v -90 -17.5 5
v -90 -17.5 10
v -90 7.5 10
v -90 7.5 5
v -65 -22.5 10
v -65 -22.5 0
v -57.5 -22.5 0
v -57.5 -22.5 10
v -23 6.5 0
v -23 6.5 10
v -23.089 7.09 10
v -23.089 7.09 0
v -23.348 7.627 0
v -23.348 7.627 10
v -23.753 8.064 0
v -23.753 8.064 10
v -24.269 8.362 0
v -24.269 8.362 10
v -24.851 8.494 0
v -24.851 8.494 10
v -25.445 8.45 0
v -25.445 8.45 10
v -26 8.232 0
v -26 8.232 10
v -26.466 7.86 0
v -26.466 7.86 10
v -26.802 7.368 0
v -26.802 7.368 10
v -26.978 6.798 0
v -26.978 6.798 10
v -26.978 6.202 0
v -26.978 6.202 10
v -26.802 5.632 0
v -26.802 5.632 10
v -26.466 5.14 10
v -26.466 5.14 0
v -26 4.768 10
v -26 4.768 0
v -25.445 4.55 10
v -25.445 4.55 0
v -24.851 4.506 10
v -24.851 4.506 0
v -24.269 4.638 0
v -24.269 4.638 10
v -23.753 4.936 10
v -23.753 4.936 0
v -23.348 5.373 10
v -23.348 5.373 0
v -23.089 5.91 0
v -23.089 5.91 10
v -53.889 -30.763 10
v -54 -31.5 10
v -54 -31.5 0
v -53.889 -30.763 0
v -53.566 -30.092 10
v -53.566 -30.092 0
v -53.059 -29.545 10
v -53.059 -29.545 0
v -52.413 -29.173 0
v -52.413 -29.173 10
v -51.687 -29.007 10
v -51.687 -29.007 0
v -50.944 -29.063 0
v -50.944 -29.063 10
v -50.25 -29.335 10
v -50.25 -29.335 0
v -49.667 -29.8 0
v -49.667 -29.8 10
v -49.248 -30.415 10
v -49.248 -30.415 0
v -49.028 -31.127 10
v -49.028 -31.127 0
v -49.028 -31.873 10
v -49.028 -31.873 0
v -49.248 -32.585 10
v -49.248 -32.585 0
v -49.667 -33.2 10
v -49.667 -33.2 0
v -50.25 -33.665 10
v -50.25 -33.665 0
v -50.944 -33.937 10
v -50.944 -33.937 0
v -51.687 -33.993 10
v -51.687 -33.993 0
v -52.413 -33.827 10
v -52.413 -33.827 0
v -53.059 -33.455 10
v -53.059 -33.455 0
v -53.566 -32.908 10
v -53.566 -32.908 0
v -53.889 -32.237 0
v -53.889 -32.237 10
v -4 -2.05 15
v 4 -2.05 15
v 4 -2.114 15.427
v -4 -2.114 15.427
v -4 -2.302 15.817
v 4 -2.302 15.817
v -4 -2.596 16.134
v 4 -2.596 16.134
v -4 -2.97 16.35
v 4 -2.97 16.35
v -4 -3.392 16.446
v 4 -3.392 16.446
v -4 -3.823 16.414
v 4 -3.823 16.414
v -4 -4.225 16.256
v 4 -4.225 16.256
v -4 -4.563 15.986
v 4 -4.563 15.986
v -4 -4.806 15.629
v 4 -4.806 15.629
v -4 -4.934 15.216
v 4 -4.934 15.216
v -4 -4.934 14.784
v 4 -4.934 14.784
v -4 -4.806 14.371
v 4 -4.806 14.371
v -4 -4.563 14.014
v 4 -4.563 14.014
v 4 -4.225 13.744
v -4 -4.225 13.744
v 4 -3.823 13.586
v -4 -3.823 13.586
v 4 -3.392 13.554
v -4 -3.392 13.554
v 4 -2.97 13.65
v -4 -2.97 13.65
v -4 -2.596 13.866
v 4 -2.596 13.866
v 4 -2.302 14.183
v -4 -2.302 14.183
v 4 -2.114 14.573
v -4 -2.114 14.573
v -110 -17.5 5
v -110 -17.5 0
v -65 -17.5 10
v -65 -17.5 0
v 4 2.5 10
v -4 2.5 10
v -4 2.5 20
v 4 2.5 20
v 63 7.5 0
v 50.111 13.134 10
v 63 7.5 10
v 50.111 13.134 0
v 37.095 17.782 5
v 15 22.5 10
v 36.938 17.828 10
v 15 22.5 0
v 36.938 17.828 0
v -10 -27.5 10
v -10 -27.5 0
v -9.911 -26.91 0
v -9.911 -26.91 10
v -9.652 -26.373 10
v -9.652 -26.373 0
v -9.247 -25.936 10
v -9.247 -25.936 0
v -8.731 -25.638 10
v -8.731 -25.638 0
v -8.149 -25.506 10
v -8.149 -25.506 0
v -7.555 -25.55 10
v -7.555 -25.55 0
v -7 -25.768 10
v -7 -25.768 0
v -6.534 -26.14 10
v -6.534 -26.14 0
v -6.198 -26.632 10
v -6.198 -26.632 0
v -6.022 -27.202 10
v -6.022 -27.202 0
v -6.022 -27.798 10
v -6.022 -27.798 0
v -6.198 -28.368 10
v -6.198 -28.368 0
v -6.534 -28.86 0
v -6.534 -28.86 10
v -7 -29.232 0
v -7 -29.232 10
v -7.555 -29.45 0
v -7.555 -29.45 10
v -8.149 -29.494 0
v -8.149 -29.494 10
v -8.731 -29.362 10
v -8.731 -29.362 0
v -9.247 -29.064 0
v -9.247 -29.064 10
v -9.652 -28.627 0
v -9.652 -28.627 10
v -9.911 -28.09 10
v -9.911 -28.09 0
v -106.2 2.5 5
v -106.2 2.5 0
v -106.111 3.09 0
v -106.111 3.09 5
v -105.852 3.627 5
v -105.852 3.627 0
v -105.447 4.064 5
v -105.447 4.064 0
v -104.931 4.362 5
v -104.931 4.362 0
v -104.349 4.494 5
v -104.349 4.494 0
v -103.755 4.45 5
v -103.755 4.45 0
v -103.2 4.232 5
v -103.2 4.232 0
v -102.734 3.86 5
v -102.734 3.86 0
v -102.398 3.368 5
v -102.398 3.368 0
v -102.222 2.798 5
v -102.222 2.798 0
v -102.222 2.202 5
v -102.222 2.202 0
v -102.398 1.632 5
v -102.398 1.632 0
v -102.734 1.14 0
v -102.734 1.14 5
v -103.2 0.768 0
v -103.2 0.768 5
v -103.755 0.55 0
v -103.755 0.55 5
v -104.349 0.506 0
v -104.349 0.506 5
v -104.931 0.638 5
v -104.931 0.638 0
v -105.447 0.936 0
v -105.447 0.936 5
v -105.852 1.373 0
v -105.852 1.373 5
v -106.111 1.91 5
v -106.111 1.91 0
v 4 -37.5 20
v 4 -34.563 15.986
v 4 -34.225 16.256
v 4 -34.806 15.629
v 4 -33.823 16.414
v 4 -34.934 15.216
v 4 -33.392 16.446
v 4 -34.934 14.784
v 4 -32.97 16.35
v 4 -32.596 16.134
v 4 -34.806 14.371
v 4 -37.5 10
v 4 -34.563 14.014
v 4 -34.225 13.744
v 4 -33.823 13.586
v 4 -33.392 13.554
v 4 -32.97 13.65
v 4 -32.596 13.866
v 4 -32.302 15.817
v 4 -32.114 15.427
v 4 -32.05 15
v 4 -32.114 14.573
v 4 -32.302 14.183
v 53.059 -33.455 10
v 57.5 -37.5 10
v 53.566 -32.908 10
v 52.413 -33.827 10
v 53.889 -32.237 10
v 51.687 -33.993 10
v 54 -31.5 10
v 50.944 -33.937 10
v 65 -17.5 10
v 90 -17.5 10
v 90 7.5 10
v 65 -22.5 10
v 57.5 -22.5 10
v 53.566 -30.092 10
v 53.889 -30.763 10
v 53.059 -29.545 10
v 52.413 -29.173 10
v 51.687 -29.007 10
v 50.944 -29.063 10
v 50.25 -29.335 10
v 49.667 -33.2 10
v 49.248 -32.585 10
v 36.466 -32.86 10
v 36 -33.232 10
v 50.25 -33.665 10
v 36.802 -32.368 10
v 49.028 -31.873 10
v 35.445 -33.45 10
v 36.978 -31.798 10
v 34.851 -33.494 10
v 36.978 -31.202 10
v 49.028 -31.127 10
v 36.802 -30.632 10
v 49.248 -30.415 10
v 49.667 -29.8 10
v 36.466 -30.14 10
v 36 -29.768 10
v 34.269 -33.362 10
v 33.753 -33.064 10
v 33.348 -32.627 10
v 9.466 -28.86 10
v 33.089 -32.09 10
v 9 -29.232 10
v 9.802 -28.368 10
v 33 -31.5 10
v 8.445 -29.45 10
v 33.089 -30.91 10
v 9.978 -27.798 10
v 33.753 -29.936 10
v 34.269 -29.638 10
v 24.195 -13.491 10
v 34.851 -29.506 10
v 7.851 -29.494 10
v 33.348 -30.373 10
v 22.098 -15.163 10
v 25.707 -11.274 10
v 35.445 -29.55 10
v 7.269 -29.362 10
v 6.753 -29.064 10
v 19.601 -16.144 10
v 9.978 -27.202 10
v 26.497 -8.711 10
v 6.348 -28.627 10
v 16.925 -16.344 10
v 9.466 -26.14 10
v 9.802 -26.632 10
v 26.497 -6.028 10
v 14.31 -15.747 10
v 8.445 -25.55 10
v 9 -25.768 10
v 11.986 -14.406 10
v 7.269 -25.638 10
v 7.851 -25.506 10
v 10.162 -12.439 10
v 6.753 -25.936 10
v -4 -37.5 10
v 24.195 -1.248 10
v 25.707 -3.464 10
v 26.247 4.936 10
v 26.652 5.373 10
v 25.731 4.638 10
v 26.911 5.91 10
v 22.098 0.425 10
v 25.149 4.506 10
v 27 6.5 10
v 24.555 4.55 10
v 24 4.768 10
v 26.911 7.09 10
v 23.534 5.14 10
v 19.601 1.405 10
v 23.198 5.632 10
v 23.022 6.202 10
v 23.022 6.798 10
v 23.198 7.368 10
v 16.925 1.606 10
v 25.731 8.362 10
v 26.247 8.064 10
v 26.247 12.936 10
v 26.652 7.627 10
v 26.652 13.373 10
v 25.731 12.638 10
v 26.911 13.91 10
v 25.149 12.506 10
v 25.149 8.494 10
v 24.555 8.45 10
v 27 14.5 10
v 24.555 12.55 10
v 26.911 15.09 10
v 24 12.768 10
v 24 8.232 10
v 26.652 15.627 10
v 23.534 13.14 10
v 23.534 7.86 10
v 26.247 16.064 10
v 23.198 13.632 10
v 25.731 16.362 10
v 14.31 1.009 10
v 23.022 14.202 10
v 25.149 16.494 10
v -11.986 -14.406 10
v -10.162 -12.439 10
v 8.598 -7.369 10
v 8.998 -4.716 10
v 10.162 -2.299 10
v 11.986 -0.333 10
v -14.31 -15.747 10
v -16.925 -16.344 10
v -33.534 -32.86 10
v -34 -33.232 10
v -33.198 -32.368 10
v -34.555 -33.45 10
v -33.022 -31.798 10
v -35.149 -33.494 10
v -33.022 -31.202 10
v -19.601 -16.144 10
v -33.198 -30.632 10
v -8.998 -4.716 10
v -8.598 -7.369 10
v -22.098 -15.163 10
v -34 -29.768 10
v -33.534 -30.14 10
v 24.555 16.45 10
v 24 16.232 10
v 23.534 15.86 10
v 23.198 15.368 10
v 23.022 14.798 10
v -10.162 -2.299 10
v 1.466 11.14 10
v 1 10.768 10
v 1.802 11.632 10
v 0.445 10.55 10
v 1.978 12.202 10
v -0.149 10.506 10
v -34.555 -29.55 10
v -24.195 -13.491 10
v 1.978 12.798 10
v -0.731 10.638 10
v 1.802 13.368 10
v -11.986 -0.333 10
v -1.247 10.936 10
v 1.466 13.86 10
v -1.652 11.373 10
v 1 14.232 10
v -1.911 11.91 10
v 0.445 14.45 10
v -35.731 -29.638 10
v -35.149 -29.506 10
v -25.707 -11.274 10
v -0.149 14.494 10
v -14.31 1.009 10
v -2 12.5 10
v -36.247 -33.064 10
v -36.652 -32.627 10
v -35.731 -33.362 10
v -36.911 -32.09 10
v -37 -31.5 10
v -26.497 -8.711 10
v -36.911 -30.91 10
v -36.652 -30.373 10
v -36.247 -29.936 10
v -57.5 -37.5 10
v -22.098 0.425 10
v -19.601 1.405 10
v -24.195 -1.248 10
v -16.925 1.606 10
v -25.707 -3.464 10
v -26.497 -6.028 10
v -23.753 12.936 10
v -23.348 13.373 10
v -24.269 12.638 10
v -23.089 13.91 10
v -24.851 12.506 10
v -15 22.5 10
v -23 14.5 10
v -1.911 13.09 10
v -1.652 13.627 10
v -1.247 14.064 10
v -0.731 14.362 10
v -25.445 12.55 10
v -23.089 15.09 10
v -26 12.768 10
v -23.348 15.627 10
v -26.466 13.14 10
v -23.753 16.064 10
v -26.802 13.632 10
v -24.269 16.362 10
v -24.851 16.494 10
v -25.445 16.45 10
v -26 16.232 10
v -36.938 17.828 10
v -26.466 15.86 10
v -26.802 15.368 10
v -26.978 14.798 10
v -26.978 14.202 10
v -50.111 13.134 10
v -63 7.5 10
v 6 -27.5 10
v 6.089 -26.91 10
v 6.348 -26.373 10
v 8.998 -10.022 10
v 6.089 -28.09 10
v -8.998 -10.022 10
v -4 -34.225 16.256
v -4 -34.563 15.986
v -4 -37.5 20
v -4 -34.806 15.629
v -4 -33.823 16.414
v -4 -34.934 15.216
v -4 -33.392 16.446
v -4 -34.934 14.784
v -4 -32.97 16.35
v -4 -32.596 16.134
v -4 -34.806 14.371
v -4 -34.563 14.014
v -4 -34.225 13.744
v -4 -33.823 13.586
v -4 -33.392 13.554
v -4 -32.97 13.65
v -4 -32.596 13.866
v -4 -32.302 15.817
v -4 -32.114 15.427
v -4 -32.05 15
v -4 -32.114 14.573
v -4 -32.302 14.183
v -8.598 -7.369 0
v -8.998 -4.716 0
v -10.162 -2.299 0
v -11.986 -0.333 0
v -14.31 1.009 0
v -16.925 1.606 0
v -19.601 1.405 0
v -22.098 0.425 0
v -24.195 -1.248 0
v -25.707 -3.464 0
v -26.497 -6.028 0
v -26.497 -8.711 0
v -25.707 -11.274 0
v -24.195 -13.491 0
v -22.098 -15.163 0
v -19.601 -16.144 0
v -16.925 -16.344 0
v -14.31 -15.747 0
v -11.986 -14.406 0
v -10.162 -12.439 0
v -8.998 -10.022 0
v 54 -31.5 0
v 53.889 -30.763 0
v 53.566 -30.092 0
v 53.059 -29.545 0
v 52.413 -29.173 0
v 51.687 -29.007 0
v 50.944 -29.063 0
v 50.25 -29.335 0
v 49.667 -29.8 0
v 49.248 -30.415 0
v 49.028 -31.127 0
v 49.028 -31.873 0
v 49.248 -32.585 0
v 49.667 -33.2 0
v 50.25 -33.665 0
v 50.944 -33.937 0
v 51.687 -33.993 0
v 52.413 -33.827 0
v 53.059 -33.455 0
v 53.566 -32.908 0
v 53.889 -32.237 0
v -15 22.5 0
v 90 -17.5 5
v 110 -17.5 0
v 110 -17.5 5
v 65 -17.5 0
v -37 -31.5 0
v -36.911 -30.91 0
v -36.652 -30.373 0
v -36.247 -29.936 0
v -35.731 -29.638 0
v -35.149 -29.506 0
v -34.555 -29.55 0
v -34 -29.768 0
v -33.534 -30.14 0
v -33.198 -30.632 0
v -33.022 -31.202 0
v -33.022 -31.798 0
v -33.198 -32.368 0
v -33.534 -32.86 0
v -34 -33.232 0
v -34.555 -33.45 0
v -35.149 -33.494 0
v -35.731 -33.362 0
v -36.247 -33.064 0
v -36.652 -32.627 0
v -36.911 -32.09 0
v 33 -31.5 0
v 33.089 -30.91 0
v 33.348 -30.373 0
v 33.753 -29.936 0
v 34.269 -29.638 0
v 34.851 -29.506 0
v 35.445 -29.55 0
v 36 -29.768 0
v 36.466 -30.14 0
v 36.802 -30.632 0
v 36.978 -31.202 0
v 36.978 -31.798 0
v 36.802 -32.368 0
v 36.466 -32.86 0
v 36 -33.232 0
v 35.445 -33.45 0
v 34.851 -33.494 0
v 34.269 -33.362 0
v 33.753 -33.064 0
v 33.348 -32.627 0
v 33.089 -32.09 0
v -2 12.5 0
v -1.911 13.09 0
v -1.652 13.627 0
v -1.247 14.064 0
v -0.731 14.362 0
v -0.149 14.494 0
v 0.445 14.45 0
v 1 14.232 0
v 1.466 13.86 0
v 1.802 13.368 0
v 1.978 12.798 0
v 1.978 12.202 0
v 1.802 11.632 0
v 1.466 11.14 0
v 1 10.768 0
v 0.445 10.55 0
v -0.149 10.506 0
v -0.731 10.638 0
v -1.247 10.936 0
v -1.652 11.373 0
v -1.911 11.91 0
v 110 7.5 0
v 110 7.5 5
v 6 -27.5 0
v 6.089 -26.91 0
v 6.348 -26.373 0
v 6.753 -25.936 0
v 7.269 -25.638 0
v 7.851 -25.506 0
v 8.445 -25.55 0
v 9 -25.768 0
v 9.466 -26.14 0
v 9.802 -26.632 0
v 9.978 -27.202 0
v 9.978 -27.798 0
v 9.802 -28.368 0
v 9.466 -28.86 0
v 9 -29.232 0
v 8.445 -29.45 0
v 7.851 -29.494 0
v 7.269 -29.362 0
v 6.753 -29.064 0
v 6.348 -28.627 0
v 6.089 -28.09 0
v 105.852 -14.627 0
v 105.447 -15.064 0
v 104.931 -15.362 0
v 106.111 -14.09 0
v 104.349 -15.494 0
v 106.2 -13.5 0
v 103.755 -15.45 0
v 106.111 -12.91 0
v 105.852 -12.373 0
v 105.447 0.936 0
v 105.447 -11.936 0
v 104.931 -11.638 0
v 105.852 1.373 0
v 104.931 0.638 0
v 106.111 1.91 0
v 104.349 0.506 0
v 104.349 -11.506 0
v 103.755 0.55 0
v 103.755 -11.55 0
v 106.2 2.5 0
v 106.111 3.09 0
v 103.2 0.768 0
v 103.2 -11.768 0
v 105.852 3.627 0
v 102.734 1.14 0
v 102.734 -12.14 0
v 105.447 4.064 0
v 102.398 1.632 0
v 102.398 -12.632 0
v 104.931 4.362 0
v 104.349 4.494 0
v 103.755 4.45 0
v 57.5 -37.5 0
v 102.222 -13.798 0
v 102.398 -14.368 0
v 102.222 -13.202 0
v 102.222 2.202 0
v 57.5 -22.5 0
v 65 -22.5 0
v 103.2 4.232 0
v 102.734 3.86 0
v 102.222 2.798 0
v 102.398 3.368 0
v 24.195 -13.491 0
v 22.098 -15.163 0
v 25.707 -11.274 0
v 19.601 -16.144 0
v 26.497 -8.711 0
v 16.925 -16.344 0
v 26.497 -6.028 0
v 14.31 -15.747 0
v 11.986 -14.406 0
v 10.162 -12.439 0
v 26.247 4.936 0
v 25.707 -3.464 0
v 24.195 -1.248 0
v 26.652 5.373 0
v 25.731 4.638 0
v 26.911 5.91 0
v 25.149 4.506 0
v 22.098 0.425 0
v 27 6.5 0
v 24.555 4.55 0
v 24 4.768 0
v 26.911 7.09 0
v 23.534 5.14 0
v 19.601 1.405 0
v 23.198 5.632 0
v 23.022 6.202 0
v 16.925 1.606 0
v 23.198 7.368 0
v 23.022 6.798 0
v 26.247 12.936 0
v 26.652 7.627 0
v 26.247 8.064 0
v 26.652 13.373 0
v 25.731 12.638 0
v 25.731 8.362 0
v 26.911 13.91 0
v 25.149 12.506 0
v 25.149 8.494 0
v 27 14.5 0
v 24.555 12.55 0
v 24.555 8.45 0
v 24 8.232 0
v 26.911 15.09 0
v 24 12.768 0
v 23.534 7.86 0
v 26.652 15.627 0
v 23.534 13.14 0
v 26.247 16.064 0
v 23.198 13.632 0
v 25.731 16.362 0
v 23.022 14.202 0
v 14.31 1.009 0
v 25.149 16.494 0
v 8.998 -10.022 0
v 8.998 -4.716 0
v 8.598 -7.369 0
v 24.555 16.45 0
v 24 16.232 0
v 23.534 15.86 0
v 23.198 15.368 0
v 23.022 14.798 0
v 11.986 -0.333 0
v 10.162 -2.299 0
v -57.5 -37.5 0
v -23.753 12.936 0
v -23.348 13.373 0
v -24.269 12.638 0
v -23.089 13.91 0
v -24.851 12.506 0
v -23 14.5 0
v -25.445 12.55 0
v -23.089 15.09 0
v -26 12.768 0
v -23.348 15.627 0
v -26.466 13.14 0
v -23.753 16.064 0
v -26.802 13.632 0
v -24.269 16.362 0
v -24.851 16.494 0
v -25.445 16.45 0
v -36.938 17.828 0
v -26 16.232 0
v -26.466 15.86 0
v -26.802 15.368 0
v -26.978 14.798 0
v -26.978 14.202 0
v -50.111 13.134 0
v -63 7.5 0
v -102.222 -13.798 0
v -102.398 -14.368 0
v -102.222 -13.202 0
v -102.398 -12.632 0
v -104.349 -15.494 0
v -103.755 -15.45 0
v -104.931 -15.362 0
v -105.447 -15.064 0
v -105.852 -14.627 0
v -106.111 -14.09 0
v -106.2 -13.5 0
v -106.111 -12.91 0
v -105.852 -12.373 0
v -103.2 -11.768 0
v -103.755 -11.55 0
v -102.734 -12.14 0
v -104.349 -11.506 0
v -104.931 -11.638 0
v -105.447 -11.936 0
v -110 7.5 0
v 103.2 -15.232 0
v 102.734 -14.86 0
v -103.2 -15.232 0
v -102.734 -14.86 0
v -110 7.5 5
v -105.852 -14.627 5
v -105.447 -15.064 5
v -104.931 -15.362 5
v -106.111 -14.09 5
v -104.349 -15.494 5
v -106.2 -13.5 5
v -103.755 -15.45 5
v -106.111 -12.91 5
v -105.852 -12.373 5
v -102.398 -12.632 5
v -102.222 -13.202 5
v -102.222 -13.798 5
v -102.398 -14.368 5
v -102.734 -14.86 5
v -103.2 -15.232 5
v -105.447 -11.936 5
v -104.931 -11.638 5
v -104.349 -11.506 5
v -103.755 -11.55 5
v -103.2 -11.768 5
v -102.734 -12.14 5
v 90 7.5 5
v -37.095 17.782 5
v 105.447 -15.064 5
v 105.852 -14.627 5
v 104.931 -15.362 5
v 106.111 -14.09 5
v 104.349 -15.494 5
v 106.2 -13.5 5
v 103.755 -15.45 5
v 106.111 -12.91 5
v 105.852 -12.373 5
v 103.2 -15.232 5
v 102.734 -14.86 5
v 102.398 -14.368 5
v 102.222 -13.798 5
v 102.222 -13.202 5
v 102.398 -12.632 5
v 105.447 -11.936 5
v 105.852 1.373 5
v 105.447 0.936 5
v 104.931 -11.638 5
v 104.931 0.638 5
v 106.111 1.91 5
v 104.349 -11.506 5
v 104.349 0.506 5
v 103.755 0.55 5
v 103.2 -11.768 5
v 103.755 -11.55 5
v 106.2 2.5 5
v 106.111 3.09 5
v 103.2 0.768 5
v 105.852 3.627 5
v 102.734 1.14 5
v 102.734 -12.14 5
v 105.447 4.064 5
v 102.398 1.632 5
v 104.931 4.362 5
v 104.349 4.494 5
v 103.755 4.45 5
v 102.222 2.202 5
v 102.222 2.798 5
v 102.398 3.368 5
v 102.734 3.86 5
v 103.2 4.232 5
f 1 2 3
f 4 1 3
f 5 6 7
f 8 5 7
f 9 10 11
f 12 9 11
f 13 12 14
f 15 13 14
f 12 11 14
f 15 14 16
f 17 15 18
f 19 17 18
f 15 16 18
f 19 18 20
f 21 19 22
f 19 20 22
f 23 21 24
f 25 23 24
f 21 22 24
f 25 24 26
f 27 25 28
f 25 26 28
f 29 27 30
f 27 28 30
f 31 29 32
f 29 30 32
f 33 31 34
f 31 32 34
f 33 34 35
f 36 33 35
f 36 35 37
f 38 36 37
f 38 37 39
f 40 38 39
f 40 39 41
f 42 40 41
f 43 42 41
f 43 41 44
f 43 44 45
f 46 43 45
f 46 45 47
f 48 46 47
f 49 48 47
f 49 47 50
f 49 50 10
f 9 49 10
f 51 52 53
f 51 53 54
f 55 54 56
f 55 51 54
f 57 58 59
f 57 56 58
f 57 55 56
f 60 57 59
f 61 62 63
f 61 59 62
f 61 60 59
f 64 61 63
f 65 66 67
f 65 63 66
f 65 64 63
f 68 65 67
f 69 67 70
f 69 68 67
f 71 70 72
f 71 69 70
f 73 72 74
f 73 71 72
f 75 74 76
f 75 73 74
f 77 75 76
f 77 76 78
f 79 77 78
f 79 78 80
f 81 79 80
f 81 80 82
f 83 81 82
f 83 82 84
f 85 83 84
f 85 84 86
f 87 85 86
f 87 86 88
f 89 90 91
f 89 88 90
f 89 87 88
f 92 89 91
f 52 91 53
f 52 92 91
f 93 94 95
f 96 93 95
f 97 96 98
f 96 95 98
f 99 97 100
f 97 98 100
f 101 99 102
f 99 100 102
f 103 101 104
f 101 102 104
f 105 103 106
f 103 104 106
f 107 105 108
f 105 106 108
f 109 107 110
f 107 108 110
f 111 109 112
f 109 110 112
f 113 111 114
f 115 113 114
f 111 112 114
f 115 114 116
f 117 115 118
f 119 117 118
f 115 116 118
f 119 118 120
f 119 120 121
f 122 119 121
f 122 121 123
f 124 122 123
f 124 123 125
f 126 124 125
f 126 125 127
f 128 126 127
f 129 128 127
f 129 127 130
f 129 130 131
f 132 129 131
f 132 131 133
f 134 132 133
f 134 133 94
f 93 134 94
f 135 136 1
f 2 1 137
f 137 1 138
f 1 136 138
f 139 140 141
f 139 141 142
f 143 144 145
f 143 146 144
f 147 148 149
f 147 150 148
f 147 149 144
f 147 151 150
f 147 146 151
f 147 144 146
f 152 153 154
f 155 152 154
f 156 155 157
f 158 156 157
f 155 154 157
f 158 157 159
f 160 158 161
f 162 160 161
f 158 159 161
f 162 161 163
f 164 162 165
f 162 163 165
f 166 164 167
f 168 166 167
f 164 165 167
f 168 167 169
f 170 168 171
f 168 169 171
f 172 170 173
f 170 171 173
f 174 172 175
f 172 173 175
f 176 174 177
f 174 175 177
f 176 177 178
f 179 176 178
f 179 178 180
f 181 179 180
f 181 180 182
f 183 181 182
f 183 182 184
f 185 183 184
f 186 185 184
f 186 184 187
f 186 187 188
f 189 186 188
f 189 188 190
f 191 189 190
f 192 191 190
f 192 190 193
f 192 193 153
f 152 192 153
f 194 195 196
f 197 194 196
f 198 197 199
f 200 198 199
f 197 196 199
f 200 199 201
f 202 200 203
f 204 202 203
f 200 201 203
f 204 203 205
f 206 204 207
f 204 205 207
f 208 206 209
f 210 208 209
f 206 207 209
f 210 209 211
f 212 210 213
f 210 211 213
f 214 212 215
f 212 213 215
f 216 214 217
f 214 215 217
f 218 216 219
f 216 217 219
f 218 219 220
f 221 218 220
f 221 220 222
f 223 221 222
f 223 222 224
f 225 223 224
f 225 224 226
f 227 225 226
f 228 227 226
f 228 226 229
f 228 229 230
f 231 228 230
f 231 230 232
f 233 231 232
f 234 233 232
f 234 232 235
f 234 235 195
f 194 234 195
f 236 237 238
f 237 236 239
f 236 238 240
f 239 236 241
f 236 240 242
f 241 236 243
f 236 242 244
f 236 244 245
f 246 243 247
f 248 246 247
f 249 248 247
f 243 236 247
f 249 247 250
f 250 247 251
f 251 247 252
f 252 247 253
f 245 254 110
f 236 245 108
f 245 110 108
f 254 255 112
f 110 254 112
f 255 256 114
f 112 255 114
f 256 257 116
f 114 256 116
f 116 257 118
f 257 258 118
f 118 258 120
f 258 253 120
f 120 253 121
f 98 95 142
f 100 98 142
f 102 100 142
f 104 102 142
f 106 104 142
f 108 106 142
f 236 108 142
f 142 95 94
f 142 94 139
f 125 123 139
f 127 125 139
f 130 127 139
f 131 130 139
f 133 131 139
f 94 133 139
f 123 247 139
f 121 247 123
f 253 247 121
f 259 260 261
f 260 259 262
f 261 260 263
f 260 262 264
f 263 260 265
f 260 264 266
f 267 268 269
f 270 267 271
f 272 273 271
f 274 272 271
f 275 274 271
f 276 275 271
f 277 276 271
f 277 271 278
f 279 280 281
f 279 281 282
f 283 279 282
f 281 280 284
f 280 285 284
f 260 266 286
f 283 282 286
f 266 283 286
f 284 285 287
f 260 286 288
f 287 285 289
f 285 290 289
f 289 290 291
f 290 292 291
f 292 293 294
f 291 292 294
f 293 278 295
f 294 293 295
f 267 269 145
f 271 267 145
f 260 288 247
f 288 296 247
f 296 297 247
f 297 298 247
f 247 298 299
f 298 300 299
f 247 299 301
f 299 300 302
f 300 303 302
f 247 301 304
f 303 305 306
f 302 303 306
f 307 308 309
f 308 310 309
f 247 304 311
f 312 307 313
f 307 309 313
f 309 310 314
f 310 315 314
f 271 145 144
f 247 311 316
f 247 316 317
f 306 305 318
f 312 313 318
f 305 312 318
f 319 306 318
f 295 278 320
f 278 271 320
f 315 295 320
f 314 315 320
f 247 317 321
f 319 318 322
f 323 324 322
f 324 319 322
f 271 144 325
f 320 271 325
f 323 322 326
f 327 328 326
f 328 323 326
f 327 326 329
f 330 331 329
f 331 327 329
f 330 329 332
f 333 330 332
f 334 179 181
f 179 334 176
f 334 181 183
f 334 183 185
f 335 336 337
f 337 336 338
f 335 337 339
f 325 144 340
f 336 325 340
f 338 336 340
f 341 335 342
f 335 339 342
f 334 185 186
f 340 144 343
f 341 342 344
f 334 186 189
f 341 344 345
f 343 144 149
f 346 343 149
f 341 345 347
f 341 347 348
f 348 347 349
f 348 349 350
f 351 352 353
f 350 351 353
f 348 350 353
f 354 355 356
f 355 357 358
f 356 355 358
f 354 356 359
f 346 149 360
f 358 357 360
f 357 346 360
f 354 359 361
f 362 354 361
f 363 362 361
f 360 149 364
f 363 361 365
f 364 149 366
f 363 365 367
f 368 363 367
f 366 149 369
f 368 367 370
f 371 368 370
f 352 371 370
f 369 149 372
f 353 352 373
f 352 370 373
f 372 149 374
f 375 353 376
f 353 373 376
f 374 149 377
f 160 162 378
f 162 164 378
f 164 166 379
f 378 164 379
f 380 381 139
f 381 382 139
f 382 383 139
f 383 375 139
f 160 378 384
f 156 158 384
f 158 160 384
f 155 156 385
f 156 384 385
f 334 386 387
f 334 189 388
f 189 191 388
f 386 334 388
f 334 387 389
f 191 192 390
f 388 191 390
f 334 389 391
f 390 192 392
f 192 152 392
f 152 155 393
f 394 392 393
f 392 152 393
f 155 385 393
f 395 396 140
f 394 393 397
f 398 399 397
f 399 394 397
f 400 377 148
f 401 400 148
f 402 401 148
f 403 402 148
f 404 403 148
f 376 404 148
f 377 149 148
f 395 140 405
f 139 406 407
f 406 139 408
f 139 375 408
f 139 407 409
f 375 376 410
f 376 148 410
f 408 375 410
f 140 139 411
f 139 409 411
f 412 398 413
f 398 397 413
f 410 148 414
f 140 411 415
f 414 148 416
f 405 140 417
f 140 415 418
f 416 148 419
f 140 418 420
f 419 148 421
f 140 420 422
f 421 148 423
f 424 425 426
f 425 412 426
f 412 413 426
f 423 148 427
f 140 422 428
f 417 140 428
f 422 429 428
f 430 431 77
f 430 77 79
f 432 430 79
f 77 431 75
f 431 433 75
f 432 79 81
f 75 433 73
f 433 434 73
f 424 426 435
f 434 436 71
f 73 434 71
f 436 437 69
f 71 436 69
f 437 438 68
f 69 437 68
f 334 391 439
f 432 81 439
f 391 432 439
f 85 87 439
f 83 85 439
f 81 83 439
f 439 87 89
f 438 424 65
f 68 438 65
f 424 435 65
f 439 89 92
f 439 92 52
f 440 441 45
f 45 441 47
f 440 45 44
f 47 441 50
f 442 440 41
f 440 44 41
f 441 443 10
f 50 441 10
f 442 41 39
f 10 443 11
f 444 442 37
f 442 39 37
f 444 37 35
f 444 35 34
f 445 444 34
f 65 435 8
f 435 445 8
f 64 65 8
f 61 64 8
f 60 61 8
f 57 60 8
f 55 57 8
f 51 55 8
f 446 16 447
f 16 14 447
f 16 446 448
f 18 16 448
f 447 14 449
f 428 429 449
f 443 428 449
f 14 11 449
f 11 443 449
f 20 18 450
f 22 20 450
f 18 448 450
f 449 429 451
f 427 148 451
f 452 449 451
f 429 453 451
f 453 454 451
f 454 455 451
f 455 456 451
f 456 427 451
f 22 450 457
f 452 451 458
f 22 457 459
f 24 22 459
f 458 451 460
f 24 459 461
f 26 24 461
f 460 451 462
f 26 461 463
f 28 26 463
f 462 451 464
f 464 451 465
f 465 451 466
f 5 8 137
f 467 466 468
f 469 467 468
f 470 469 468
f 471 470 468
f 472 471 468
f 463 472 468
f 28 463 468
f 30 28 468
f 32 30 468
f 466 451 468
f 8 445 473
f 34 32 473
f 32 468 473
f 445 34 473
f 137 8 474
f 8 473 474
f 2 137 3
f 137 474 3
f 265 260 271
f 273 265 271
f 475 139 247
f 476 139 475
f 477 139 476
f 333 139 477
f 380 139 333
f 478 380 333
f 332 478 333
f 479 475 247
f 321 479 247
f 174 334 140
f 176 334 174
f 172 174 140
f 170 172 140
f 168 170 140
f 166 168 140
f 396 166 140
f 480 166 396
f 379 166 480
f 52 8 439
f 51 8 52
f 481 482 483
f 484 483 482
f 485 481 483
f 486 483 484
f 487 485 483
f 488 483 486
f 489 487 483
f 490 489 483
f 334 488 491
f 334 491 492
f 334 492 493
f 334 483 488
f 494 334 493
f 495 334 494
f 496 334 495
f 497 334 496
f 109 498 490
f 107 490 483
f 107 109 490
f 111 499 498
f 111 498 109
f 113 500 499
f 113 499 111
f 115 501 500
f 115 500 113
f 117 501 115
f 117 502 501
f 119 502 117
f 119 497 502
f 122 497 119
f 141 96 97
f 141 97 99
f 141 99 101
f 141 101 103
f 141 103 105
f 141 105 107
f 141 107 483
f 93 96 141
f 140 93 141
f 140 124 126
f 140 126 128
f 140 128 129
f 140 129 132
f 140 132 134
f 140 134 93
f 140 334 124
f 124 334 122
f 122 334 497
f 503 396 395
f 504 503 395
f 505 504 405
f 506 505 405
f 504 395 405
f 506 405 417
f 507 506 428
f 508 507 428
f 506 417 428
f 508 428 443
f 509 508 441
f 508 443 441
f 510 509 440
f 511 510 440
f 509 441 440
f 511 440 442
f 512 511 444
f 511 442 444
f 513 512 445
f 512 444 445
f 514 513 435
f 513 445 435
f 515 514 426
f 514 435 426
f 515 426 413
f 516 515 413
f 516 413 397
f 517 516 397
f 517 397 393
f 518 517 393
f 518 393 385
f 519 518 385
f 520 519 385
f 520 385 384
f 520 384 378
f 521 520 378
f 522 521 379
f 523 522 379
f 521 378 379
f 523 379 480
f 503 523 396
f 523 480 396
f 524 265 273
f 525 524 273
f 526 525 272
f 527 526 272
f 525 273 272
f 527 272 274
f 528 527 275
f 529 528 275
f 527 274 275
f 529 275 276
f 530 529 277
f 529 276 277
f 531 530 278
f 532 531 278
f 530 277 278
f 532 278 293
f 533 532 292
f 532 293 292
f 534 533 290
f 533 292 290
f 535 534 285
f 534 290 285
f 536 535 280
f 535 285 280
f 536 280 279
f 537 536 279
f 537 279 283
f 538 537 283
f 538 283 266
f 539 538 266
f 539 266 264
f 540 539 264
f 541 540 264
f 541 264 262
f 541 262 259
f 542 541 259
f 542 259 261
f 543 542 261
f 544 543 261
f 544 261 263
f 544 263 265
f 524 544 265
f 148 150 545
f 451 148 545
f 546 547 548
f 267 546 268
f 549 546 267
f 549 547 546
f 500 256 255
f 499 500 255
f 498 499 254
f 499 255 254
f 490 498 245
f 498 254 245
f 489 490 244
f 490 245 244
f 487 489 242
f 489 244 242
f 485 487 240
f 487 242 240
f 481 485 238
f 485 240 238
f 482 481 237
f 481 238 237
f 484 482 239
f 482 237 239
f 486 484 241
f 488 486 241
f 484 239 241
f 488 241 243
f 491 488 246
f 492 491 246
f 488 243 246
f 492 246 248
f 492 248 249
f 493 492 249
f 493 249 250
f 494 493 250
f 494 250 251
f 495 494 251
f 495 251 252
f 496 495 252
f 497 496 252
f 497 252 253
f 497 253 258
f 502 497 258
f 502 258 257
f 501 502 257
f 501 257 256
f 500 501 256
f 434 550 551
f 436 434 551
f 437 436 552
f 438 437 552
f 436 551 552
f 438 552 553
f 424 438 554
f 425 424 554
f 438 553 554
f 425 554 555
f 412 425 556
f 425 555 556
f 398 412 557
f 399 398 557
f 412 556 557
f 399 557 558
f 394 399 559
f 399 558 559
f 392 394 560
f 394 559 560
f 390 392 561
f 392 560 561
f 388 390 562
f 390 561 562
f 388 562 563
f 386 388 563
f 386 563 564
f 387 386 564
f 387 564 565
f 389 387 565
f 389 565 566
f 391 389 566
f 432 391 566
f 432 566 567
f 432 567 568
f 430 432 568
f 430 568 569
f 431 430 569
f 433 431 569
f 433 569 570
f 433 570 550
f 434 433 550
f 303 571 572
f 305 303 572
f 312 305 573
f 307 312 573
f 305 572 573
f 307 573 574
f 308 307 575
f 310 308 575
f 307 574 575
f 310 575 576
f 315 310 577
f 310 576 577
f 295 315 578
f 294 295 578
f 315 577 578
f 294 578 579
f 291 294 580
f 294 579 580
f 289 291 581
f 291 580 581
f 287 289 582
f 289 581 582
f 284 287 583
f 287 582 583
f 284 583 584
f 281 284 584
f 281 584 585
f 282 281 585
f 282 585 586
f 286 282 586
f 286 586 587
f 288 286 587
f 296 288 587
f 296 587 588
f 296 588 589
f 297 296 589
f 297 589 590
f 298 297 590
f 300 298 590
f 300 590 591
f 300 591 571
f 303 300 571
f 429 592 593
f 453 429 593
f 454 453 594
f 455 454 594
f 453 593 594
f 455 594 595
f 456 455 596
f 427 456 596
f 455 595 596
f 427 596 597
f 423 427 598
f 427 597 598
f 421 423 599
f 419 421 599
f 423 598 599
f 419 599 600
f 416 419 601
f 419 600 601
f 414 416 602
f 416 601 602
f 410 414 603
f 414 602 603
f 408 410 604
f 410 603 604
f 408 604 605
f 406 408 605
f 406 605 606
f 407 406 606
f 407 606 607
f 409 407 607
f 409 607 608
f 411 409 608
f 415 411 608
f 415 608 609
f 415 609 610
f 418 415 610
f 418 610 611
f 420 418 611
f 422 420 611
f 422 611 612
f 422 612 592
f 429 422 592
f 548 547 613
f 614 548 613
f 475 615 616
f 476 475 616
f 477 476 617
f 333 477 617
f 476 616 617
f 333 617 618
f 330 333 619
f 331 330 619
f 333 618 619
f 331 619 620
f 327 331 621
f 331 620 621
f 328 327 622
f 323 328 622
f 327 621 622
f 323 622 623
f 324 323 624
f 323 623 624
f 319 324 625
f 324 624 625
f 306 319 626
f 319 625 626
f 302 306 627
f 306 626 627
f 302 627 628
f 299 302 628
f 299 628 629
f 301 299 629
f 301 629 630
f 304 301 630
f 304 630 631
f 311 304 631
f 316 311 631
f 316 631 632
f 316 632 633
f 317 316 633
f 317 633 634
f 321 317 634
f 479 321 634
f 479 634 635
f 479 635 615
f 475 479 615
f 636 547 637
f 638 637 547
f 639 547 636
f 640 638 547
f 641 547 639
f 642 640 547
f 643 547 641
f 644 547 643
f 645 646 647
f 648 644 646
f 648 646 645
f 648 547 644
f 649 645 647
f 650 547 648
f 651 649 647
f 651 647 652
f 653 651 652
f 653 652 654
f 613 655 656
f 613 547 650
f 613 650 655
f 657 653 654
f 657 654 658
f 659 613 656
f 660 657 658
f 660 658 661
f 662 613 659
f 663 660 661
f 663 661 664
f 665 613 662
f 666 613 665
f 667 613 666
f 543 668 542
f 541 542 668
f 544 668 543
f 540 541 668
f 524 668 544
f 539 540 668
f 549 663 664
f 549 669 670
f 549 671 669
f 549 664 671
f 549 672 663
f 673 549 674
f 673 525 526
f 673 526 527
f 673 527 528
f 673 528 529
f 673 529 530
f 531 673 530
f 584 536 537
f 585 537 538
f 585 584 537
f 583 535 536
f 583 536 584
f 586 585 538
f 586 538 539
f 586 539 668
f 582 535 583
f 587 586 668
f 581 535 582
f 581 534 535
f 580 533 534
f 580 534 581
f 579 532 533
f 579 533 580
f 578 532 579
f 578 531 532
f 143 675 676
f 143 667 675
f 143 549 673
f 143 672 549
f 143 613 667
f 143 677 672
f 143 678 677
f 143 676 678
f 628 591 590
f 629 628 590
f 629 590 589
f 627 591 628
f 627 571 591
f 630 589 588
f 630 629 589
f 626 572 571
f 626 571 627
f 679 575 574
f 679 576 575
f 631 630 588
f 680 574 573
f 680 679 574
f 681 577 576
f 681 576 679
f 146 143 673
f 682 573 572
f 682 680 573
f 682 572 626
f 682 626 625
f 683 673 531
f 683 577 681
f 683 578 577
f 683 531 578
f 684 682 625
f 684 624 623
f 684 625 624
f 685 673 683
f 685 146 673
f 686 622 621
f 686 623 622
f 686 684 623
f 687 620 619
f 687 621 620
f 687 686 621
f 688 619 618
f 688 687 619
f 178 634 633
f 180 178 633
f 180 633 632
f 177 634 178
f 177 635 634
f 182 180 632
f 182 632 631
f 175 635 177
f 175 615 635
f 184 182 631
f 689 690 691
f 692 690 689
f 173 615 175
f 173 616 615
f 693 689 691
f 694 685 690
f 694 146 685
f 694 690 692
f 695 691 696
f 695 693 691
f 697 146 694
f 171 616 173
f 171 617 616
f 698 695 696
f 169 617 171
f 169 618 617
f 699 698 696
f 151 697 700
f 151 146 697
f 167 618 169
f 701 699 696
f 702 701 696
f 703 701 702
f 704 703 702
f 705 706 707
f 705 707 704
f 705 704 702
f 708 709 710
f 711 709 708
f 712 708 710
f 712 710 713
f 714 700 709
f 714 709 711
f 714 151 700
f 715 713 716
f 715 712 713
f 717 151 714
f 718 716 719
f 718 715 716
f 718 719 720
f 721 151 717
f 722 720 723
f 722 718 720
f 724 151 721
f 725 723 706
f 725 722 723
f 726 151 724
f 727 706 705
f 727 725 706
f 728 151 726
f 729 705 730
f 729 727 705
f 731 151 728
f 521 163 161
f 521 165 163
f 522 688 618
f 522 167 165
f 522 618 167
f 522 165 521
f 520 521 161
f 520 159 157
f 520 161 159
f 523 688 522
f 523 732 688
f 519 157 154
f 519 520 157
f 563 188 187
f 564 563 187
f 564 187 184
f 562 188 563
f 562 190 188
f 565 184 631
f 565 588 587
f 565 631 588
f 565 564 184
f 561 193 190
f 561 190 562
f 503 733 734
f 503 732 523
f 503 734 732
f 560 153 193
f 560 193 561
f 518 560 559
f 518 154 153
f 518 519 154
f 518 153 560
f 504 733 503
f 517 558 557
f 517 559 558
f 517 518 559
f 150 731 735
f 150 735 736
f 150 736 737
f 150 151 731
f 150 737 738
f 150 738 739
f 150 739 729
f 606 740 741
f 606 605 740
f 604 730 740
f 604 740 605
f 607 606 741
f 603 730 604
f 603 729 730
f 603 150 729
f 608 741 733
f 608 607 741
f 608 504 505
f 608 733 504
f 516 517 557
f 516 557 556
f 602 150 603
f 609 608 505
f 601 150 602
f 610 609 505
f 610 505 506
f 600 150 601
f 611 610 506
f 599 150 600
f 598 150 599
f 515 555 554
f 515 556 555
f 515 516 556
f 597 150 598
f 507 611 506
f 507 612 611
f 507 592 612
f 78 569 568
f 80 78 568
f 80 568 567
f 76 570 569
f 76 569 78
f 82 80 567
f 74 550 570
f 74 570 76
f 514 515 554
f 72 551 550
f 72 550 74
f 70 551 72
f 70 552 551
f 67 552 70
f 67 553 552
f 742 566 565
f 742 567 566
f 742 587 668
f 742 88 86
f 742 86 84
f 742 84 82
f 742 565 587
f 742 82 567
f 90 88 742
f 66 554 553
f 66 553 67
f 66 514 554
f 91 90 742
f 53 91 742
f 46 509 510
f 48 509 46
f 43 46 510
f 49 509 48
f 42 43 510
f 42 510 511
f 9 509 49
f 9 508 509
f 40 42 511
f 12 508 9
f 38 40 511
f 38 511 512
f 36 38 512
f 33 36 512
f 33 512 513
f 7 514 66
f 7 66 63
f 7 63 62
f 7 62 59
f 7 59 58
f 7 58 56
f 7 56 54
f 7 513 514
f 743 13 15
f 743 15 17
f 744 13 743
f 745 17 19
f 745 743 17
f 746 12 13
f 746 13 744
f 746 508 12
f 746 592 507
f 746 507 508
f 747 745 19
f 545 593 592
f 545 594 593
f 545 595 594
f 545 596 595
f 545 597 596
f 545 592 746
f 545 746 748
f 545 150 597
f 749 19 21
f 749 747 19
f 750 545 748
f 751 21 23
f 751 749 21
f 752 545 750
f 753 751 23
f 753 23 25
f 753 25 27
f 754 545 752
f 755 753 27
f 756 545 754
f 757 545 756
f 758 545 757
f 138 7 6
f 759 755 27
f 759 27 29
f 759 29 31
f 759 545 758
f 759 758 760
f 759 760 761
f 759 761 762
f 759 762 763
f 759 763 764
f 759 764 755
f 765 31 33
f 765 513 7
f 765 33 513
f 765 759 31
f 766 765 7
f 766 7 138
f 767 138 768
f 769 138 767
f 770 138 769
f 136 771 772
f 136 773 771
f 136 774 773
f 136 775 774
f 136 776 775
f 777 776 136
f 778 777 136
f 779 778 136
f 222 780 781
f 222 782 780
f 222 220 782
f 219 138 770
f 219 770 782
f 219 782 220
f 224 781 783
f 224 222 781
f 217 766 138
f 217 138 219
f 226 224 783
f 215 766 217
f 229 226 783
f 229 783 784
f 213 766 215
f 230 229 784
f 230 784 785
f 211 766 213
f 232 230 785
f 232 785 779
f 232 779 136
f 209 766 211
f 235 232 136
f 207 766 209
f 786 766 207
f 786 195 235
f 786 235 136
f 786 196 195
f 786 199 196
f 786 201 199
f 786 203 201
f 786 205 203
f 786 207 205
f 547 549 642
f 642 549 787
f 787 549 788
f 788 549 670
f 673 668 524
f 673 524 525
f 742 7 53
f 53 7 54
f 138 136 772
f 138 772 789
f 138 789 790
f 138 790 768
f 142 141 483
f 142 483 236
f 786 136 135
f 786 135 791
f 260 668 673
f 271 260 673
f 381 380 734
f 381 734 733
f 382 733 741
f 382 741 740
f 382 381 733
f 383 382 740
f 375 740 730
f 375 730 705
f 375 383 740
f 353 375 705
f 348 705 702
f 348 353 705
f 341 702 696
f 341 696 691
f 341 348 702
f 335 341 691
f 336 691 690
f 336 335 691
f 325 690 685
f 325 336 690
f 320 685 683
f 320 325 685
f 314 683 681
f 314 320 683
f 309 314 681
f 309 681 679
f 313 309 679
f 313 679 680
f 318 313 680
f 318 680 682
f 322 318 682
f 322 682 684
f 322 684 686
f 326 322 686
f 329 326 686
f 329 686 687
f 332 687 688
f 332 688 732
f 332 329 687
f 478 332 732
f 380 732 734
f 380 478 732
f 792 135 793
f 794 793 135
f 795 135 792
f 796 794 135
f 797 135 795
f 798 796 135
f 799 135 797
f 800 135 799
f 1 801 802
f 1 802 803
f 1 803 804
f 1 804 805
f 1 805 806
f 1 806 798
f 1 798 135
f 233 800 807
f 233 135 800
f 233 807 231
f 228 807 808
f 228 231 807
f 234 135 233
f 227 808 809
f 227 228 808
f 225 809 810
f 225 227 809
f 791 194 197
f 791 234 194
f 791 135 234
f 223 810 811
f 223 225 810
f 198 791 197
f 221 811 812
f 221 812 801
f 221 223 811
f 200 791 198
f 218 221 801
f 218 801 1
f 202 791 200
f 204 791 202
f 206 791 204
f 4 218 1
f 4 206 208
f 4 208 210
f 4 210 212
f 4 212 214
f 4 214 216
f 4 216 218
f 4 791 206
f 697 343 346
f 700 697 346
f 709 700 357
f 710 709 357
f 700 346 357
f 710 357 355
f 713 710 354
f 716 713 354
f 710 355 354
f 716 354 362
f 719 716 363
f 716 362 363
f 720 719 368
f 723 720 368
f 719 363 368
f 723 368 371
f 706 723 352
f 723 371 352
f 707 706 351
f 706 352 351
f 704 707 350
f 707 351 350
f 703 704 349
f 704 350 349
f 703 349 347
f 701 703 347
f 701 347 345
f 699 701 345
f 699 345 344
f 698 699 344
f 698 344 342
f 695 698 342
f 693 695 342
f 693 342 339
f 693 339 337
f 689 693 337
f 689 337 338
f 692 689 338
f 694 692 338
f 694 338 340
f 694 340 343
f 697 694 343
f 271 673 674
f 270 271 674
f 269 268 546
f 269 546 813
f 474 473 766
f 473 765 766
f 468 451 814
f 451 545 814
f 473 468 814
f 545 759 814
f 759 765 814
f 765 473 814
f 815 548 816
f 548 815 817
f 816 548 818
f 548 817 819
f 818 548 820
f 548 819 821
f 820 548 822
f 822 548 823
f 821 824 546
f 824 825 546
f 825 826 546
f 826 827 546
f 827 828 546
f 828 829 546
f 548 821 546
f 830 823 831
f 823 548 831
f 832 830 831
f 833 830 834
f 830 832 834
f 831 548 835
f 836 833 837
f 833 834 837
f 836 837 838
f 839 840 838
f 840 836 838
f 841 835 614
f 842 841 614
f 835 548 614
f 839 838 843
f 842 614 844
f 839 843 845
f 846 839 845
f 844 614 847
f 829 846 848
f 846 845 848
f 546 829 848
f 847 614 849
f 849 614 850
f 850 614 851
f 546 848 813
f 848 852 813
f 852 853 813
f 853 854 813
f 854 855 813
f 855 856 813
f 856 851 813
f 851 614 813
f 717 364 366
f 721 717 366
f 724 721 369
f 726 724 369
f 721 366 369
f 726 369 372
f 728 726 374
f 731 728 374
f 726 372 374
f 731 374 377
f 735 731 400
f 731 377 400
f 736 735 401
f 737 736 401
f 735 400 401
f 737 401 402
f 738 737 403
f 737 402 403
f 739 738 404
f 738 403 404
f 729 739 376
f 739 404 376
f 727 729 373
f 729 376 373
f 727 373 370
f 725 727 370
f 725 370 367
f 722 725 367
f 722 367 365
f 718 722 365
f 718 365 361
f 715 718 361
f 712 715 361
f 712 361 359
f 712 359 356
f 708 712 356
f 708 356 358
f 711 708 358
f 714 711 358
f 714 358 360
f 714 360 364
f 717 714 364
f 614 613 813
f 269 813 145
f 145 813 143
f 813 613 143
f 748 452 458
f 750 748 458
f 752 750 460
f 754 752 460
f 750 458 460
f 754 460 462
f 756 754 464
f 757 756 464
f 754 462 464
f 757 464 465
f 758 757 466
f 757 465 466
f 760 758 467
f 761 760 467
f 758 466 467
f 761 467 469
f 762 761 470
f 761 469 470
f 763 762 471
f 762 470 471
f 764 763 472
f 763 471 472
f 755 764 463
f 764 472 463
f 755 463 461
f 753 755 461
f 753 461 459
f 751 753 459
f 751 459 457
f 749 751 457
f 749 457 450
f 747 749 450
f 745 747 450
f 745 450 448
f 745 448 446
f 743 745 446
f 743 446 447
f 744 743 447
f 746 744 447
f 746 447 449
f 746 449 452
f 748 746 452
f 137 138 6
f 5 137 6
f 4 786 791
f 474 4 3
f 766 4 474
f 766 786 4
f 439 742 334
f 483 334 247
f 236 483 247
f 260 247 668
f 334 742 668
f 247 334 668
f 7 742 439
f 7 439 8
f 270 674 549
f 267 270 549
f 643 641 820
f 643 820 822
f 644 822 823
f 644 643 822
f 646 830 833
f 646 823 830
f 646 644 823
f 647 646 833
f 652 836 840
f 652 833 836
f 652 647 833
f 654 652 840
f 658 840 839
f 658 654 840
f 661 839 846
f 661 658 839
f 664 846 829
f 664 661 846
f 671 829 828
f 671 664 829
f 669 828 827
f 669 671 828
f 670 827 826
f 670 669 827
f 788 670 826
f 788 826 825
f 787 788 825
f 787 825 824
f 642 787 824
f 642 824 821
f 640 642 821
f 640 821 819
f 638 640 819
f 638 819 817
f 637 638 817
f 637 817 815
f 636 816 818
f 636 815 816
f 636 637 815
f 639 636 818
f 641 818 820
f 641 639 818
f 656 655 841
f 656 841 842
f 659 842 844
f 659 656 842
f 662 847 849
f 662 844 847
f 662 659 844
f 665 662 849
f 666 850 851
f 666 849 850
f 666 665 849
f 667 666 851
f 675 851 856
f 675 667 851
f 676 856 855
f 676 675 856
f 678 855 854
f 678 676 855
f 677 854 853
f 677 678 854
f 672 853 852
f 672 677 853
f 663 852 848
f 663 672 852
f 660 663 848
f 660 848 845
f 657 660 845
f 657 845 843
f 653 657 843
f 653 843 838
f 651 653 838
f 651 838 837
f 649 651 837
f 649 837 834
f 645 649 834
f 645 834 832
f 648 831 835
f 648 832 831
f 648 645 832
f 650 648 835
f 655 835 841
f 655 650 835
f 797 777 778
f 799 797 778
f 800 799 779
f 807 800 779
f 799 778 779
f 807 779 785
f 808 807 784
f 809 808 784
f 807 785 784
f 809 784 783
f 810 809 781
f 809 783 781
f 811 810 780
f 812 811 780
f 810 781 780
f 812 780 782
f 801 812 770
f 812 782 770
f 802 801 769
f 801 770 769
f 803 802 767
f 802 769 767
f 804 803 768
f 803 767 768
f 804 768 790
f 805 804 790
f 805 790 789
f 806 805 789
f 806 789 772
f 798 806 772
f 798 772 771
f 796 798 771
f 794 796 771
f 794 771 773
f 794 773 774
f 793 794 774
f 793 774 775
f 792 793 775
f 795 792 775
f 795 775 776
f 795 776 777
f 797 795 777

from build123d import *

# Parameters (mm, degrees)
EXTRUDE1_DEPTH                 = 10
SKETCH2_W                      = 115
SKETCH2_H                      = 15
EXTRUDE2_DEPTH                 = 10
F_4_0_4_DIAMETER_HOLE1_D       = 4
F_4_0_4_DIAMETER_HOLE1_DEPTH   = 15
SKETCH4_W                      = 8
SKETCH4_H                      = 40
EXTRUDE3_DEPTH                 = 10
F_4_0_4_DIAMETER_HOLE3_D       = 4
F_4_0_4_DIAMETER_HOLE3_DEPTH   = 15
F_5_0_5_DIAMETER_HOLE1_D       = 5
F_5_0_5_DIAMETER_HOLE1_DEPTH   = 15
F_4_0_4_DIAMETER_HOLE5_D       = 4
F_4_0_4_DIAMETER_HOLE5_DEPTH   = 15
F_2_9_2_9_DIAMETER_HOLE1_D     = 2.9
F_2_9_2_9_DIAMETER_HOLE1_DEPTH = 10
SKETCH11_R                     = 9
EXTRUDE5_DEPTH                 = 10
SKETCH12_W                     = 45
SKETCH12_H                     = 25
EXTRUDE6_DEPTH                 = 10
SKETCH14_W                     = 20
SKETCH14_H                     = 25
EXTRUDE8_DEPTH                 = 5
F_4_0_4_DIAMETER_HOLE6_D       = 4
F_4_0_4_DIAMETER_HOLE6_DEPTH   = 15


with BuildPart() as part:
    # Sketch1 → Extrude1 (new body)
    with BuildSketch(Plane.XY):
        with BuildLine():
            Line((-65, -22.5), (65, -22.5))
            Line((65, -22.5), (65, 7.5))
            Line((65, 7.5), (63, 7.5))
            add(Edge.make_bspline(
                [(15, 22.5), (22.446642829, 21.197279562), (39.079741244, 18.287474734), (54.489303237, 11.338124296), (63, 7.5)],
                knots=[0, 0, 0, 0, 0.447700281, 1, 1, 1, 1], degree=3))
            Line((15, 22.5), (-15, 22.5))
            add(Edge.make_bspline(
                [(-15, 22.5), (-22.446642829, 21.197279562), (-39.079741244, 18.287474734), (-54.489303237, 11.338124296), (-63, 7.5)],
                knots=[0, 0, 0, 0, 0.447700281, 1, 1, 1, 1], degree=3))
            Line((-63, 7.5), (-65, 7.5))
            Line((-65, 7.5), (-65, -22.5))
        make_face()
    extrude(amount=EXTRUDE1_DEPTH)

    # Sketch2 → Extrude2 (add)
    with BuildSketch(Plane.XY):
        with Locations((0, -30)):
            Rectangle(SKETCH2_W, SKETCH2_H)
    extrude(amount=EXTRUDE2_DEPTH)

    # Ø4.0 (4) Diameter Hole1
    with Locations(Plane(origin=(-35, -31.5, 10), x_dir=(1, 0, 0), z_dir=(0, 0, 1))):
        with Locations((0, 0), (70, 0)):
            Hole(F_4_0_4_DIAMETER_HOLE1_D / 2, depth=F_4_0_4_DIAMETER_HOLE1_DEPTH)

    # Sketch4 → Extrude3 (add)
    with BuildSketch(Plane.XY.offset(10)):
        with Locations((0, -17.5)):
            Rectangle(SKETCH4_W, SKETCH4_H)
    extrude(amount=EXTRUDE3_DEPTH)

    # Ø4.0 (4) Diameter Hole3
    with Locations(Plane(origin=(25, 14.5, 0), x_dir=(-1, 0, 0), z_dir=(0, 0, -1))):
        with Locations((0, 0), (50, 0), (0, -8), (50, -8)):
            Hole(F_4_0_4_DIAMETER_HOLE3_D / 2, depth=F_4_0_4_DIAMETER_HOLE3_DEPTH)

    # Ø5.0 (5) Diameter Hole1
    with Locations(Plane(origin=(51.5, -31.5, 0), x_dir=(-1, 0, 0), z_dir=(0, 0, -1))):
        with Locations((0, 0)):
            f_5_0_5_diameter_hole1 = Hole(F_5_0_5_DIAMETER_HOLE1_D / 2, depth=F_5_0_5_DIAMETER_HOLE1_DEPTH)

    # Ø4.0 (4) Diameter Hole5
    with Locations(Plane(origin=(-8, -27.5, 10), x_dir=(1, 0, 0), z_dir=(0, 0, 1))):
        with Locations((0, 0), (16, 0), (8, 40)):
            Hole(F_4_0_4_DIAMETER_HOLE5_D / 2, depth=F_4_0_4_DIAMETER_HOLE5_DEPTH)

    # Mirror2: Ø5.0 (5) Diameter Hole1 across plane
    add(f_5_0_5_diameter_hole1.mirror(Plane(origin=(0, 0, 0), x_dir=(0, 0, 1), z_dir=(1, 0, 0))), mode=Mode.SUBTRACT)

    # Ø2.9 (2.9) Diameter Hole1
    with Locations(Plane(origin=(-4, -3.5, 15), x_dir=(0, -1, 0), z_dir=(-1, 0, 0))):
        with Locations((0, 0), (30, 0)):
            Hole(F_2_9_2_9_DIAMETER_HOLE1_D / 2, depth=F_2_9_2_9_DIAMETER_HOLE1_DEPTH)

    # Sketch11 → Extrude5 (cut)
    with BuildSketch(Plane.XY.offset(10)):
        with Locations((-17.597830753, -7.369190246)):
            Circle(SKETCH11_R)
    extrude5 = extrude(amount=-EXTRUDE5_DEPTH, mode=Mode.SUBTRACT)

    # Mirror3: Extrude5 across plane
    add(extrude5.mirror(Plane(origin=(0, 0, 0), x_dir=(0, 0, 1), z_dir=(1, 0, 0))), mode=Mode.SUBTRACT)

    # Sketch12 → Extrude6 (add)
    with BuildSketch(Plane.XY):
        with Locations((-87.5, -5)):
            Rectangle(SKETCH12_W, SKETCH12_H)
    extrude6 = extrude(amount=EXTRUDE6_DEPTH)

    # Sketch14 → Extrude8 (cut)
    with BuildSketch(Plane.XY.offset(10)):
        with Locations((-100, -5)):
            Rectangle(SKETCH14_W, SKETCH14_H)
    extrude8 = extrude(amount=-EXTRUDE8_DEPTH, mode=Mode.SUBTRACT)

    # Ø4.0 (4) Diameter Hole6
    with Locations(Plane(origin=(-104.2, 2.5, 5), x_dir=(1, 0, 0), z_dir=(0, 0, 1))):
        with Locations((0, 0), (0, -16)):
            f_4_0_4_diameter_hole6 = Hole(F_4_0_4_DIAMETER_HOLE6_D / 2, depth=F_4_0_4_DIAMETER_HOLE6_DEPTH)

    # Mirror5: Extrude6, Extrude8, Ø4.0 (4) Diameter Hole6 across plane
    add(extrude6.mirror(Plane(origin=(0, 0, 0), x_dir=(0, 0, 1), z_dir=(1, 0, 0))))
    add(extrude8.mirror(Plane(origin=(0, 0, 0), x_dir=(0, 0, 1), z_dir=(1, 0, 0))), mode=Mode.SUBTRACT)
    add(f_4_0_4_diameter_hole6.mirror(Plane(origin=(0, 0, 0), x_dir=(0, 0, 1), z_dir=(1, 0, 0))), mode=Mode.SUBTRACT)


solid = part.part
